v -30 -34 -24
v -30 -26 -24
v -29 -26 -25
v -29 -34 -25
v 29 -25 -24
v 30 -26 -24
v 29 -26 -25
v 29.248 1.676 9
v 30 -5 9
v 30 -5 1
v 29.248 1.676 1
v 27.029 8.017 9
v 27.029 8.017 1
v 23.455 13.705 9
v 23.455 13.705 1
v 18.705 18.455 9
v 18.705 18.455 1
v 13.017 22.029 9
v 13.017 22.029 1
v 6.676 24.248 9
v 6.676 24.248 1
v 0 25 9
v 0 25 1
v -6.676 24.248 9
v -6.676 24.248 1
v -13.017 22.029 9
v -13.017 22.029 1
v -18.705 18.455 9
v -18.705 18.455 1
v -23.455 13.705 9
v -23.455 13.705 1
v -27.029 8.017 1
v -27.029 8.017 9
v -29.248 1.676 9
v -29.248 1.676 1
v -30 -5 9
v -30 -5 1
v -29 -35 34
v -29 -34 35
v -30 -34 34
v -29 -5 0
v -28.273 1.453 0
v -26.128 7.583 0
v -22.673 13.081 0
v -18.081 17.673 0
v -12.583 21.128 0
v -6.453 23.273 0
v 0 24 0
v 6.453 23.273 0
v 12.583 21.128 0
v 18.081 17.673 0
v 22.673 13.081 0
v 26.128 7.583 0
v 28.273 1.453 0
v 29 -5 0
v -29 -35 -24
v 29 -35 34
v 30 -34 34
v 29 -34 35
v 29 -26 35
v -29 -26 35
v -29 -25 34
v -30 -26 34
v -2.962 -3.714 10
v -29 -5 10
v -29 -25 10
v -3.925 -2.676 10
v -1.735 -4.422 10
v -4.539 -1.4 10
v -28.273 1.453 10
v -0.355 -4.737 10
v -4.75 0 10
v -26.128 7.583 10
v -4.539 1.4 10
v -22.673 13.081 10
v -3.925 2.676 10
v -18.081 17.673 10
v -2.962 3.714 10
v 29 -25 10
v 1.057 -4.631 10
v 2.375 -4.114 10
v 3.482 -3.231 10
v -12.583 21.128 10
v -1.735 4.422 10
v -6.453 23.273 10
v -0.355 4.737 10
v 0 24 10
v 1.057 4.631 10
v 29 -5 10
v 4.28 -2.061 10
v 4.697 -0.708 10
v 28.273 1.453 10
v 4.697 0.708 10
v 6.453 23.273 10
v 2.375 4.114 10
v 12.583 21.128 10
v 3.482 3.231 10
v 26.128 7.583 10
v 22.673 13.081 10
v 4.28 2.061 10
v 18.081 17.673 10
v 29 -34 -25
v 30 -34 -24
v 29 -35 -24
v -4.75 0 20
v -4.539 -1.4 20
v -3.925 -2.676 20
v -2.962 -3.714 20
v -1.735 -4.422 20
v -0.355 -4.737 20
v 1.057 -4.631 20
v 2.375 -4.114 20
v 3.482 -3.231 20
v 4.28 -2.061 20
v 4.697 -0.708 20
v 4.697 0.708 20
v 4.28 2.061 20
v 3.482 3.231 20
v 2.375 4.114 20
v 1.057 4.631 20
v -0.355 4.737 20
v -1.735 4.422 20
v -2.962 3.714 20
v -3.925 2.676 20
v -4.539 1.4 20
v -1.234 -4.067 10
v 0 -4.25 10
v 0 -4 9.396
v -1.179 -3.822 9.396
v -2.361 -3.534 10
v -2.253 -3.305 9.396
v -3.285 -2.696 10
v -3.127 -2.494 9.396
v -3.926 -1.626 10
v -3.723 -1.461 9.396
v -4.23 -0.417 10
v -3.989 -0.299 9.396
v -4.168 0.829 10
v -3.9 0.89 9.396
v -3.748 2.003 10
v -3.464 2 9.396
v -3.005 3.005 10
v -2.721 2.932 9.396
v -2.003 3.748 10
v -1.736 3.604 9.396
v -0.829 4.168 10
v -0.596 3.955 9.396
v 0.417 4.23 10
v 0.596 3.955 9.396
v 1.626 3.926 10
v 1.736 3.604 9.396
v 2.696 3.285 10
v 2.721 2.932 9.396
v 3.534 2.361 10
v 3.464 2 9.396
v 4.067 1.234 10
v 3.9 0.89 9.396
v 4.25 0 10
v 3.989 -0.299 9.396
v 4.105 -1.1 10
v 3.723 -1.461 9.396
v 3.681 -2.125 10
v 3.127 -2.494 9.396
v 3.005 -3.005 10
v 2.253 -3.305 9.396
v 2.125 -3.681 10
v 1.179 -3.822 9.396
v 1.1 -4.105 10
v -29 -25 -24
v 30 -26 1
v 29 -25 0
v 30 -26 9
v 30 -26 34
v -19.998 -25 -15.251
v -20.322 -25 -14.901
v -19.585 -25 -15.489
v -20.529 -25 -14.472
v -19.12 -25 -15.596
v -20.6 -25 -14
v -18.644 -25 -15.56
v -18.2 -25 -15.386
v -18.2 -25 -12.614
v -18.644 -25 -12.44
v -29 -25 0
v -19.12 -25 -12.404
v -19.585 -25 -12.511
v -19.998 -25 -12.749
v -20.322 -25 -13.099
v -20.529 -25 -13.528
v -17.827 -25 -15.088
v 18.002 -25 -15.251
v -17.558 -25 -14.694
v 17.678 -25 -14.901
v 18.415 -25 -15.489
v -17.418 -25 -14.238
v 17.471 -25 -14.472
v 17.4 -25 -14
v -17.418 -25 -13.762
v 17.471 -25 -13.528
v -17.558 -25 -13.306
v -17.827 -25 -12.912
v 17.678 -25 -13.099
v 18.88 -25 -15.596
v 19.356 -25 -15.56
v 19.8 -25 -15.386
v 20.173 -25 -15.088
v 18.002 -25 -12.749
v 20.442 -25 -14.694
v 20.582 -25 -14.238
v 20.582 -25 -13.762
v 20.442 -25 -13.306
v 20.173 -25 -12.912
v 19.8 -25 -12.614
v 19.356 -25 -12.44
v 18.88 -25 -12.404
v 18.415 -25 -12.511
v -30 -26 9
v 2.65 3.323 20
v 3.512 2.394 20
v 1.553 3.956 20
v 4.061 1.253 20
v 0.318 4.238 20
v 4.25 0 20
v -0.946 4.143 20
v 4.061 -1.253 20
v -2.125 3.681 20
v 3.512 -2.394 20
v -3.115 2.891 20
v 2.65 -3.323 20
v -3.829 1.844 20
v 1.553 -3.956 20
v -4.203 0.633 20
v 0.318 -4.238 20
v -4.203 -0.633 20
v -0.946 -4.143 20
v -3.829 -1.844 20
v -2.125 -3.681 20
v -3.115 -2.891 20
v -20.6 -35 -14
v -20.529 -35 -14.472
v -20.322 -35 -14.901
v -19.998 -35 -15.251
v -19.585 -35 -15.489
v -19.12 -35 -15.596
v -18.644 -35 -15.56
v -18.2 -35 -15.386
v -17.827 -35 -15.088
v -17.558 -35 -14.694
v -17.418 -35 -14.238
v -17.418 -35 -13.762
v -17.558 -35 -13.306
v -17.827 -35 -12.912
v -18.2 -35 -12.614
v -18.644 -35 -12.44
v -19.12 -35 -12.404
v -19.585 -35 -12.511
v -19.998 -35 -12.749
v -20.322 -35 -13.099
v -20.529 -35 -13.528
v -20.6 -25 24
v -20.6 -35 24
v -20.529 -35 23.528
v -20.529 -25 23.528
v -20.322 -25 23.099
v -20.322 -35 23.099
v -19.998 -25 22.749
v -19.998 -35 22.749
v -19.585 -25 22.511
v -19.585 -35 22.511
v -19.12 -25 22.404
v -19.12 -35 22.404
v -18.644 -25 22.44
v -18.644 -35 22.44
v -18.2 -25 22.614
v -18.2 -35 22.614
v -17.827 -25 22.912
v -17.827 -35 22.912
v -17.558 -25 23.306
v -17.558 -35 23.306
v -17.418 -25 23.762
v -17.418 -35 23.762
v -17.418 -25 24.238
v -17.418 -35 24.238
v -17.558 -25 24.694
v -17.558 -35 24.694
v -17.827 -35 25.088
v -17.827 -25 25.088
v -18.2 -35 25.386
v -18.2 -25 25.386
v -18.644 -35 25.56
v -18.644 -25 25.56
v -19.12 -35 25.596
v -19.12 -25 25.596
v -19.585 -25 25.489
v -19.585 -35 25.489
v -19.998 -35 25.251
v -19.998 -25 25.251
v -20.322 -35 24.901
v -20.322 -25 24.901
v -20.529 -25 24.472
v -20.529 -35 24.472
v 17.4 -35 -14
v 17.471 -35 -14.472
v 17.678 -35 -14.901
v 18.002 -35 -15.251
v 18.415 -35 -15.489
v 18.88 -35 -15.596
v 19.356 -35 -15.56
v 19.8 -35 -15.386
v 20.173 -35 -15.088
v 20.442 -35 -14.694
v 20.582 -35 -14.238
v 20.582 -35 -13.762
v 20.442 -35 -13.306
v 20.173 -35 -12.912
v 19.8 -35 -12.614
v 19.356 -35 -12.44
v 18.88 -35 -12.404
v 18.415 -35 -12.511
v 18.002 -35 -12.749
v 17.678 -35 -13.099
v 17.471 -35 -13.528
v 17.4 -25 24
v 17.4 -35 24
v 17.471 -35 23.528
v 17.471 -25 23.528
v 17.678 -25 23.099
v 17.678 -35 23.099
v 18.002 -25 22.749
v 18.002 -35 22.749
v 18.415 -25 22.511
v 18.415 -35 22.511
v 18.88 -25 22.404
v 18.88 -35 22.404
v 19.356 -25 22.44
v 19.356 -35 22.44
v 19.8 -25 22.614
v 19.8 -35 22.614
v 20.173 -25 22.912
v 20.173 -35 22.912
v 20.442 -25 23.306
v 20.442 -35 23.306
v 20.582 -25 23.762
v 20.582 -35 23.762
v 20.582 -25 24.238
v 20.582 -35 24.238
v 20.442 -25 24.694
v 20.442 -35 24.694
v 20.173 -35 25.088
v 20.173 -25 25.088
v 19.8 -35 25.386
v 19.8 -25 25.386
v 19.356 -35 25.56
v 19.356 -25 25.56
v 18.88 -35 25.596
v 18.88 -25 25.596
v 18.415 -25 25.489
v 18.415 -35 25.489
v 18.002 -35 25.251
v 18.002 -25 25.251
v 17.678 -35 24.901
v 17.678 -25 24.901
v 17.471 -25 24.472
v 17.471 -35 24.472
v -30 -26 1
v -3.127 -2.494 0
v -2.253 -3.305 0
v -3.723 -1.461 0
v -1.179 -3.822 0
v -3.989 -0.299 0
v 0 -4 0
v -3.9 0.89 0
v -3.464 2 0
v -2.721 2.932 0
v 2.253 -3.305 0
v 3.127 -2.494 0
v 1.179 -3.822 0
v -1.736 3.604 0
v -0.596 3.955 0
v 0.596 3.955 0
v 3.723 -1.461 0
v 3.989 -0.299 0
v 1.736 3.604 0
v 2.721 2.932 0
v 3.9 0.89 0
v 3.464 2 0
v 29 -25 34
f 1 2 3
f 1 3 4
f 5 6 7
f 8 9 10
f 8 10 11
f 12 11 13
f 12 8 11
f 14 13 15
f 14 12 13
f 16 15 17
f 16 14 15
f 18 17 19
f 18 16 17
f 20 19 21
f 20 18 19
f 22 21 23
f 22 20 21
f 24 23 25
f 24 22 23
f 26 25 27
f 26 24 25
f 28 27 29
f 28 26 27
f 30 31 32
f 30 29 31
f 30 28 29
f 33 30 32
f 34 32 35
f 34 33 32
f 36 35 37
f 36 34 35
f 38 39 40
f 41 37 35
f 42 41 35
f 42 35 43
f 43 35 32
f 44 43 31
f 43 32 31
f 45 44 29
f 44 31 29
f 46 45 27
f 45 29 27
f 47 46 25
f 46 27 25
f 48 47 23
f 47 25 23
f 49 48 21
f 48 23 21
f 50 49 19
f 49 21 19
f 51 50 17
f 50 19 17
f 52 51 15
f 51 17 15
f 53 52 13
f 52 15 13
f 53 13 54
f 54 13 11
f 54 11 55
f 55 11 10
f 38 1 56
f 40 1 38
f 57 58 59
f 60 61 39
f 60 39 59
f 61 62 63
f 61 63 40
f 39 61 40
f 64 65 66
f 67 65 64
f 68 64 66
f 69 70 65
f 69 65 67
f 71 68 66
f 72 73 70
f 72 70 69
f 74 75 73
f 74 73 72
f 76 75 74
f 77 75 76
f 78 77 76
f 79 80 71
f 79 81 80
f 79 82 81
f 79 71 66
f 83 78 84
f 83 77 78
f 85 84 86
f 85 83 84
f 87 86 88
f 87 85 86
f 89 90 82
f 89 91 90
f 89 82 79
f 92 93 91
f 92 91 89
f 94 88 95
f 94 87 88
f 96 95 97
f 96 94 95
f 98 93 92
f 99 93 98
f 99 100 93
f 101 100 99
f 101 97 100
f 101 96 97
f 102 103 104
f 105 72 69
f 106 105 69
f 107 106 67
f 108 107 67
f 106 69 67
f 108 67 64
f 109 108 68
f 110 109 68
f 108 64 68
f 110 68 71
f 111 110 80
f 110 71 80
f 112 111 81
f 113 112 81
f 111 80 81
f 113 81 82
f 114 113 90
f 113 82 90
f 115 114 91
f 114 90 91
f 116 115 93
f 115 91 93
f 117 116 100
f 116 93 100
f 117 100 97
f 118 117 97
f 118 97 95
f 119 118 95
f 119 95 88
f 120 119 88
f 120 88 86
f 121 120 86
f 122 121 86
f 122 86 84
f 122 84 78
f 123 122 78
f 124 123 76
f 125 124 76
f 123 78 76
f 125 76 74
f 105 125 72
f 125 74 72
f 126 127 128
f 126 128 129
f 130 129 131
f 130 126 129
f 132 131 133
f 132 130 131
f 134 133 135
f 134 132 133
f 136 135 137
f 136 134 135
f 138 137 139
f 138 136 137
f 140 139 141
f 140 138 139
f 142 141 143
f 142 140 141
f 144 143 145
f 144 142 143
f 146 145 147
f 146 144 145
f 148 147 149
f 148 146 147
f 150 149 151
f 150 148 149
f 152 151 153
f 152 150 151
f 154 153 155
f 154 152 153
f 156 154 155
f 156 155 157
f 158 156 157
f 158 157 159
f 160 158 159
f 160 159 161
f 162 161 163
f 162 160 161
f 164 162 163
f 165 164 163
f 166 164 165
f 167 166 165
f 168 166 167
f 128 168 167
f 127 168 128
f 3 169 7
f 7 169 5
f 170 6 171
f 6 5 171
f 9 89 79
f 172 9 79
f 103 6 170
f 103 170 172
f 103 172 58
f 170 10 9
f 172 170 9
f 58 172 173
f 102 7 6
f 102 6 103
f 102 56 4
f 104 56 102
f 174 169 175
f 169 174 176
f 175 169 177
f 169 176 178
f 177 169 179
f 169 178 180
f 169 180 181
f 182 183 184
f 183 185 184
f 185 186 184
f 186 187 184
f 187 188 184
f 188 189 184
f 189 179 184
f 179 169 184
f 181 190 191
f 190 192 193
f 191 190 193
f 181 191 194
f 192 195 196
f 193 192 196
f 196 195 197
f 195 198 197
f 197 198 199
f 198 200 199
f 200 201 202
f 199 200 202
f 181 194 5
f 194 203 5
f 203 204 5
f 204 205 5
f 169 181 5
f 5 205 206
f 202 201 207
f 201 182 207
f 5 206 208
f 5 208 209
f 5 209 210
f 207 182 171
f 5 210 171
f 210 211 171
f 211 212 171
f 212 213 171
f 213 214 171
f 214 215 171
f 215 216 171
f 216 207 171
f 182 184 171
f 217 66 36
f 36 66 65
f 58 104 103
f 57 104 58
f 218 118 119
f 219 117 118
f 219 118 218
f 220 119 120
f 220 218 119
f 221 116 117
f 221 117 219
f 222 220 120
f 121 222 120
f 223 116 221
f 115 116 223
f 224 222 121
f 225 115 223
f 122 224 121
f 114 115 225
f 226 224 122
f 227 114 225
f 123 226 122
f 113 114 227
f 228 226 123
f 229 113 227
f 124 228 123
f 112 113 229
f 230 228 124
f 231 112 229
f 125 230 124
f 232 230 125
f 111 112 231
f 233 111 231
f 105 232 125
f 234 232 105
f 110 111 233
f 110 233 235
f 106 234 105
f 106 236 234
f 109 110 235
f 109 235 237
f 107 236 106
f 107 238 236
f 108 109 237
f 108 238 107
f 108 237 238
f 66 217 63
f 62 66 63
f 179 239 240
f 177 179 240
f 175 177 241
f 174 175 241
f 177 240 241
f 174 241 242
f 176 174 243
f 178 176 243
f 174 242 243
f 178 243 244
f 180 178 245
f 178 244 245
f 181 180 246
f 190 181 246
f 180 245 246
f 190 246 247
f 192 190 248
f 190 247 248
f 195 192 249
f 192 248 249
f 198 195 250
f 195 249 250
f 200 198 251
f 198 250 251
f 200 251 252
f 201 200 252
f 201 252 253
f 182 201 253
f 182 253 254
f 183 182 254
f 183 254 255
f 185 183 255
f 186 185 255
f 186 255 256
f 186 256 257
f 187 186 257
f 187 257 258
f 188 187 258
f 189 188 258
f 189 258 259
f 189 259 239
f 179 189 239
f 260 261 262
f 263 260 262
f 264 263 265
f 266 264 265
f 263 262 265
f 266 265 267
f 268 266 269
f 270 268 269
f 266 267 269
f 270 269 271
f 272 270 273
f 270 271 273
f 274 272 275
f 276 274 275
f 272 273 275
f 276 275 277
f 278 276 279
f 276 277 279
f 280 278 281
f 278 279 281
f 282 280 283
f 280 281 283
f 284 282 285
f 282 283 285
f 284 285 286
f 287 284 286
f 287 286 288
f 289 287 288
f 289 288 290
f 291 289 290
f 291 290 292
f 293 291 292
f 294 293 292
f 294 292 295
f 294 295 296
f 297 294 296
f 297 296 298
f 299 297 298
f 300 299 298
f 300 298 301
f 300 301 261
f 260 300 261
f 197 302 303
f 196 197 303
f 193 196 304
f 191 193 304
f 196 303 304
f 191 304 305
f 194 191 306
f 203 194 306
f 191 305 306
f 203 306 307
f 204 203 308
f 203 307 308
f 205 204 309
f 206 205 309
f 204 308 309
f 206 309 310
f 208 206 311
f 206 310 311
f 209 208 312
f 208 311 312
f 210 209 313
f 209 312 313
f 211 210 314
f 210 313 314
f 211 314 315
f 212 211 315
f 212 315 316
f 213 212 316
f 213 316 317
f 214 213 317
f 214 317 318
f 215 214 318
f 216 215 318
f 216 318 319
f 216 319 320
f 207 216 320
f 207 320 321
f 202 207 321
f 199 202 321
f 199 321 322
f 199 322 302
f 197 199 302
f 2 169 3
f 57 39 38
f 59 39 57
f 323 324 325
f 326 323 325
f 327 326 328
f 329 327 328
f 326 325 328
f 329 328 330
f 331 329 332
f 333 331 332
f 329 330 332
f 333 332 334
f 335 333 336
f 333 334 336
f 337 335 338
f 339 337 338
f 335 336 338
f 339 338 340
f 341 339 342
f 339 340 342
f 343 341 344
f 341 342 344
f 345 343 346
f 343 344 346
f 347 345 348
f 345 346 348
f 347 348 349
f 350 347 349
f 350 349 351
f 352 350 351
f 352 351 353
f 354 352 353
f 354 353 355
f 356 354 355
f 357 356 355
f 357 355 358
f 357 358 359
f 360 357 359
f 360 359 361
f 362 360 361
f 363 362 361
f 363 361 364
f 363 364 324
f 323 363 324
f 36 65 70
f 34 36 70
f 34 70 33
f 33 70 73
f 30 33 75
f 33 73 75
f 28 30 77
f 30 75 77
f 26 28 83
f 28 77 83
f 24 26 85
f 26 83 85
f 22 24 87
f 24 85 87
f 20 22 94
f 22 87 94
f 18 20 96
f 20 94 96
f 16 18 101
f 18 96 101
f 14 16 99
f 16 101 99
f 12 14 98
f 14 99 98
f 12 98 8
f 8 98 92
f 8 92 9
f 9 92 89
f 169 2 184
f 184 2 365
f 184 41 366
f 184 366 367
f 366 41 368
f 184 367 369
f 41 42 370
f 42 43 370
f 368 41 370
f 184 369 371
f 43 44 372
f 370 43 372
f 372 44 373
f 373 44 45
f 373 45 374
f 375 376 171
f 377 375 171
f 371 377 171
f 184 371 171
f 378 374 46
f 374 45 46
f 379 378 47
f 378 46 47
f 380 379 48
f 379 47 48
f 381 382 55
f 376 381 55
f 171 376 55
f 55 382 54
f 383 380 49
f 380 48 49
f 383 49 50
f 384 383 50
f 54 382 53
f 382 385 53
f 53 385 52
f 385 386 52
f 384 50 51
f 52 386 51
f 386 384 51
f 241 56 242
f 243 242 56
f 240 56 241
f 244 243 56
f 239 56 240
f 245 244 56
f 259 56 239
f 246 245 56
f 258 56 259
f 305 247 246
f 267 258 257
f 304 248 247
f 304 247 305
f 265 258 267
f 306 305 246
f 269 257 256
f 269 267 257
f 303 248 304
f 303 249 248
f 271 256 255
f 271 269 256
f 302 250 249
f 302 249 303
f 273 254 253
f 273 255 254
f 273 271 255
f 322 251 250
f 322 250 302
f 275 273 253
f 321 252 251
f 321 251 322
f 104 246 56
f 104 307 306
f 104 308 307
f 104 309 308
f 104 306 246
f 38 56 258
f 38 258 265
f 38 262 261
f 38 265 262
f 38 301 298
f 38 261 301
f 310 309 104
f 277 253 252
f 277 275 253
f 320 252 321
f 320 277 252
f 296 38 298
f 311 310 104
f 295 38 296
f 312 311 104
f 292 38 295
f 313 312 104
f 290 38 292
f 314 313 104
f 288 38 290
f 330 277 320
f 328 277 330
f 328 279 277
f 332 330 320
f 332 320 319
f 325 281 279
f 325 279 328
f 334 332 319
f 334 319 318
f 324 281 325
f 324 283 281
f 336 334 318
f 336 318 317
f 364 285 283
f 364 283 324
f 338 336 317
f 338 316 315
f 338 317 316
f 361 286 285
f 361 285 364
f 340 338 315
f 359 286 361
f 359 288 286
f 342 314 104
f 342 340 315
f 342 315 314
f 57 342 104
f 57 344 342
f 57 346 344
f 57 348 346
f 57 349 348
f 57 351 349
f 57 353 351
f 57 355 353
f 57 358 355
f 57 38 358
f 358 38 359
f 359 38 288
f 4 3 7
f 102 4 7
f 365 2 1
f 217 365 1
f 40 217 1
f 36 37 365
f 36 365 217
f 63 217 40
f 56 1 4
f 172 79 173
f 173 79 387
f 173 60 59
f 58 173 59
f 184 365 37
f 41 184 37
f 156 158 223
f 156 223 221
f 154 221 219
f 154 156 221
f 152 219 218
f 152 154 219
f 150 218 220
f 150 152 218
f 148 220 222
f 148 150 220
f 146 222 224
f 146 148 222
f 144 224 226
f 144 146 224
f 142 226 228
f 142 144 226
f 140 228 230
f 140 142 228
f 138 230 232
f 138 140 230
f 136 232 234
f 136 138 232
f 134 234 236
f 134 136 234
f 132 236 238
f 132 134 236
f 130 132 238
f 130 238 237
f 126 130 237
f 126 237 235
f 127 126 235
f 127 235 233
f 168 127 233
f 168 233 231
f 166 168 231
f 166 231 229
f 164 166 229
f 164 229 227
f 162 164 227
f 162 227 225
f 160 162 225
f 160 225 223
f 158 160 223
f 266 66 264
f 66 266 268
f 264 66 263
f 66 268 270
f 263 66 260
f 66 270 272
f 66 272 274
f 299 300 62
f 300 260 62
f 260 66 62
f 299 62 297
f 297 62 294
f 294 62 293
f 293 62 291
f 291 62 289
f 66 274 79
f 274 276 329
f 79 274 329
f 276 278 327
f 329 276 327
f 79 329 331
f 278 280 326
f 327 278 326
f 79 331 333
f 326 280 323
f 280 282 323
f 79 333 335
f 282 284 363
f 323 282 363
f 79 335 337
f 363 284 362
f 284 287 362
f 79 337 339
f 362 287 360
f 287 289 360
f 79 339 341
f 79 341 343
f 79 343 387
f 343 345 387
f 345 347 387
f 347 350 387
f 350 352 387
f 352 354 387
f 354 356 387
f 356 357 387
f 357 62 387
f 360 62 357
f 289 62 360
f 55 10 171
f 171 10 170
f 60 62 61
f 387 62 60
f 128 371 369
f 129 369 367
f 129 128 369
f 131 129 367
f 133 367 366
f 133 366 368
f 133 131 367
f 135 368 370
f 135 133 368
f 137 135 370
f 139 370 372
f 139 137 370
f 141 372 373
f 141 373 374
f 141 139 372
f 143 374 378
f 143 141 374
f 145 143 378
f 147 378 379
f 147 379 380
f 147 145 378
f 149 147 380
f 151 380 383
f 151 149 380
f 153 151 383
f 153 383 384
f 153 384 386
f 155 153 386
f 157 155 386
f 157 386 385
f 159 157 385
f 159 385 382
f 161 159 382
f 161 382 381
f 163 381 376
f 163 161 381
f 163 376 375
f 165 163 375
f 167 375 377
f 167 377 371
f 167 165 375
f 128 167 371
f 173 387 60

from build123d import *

# Parameters (mm, degrees)
SKETCH_1_W      = 60
SKETCH_1_H      = 50
EXTRUDE_1_DEPTH = 10
SKETCH_8_W      = 60
SKETCH_8_H      = 60
EXTRUDE_2_DEPTH = 10
SKETCH_9_R      = 4.75
SKETCH_9_R_2    = 4.25
EXTRUDE_3_DEPTH = 10
FILLET_1_RADIUS = 30
FILLET_1_LENGTH = 10
CHAMFER_1_SIZE  = 1
HOLE_WIZARD_4_D = 3.2


with BuildPart() as part:
    # 草图1 → 凸台-拉伸1 (new body)
    with BuildSketch(Plane.XY):
        Rectangle(SKETCH_1_W, SKETCH_1_H)
    extrude(amount=EXTRUDE_1_DEPTH)

    # 草图3 → 孔1 (revolve, cut)
    with BuildSketch(Plane(origin=(0, 0, 10), x_dir=(0, -1, 0), z_dir=(1, 0, 0))):
        Polygon((0, 0), (0, 10), (4, 10), (4, 0.603553391), (4.25, 0), align=None)
    revolve(axis=Axis((0, 0, 16.445314094), (0, 0, -1)), mode=Mode.SUBTRACT)

    # 草图8 → 凸台-拉伸2 (add)
    with BuildSketch(Plane.XZ.offset(25)):
        with Locations((0, 5)):
            Rectangle(SKETCH_8_W, SKETCH_8_H)
    extrude(amount=EXTRUDE_2_DEPTH)

    # 草图9 → 凸台-拉伸3 (add)
    with BuildSketch(Plane.XY.offset(10)):
        with Locations(Location((0, 0, 0), (0, 0, 180))):
            Circle(SKETCH_9_R)
        Circle(SKETCH_9_R_2, mode=Mode.SUBTRACT)
    extrude(amount=EXTRUDE_3_DEPTH)

    # 圆角1: full round fillet: the end face becomes a half cylinder, R = half its width
    fillet_1_face = Plane((0, 25, 5), x_dir=(0, 0, 1), z_dir=(0, 1, 0))  # on the end face: x along it, z out of the body
    fillet_1_slab = fillet_1_face.offset(-FILLET_1_RADIUS / 2) * Box(FILLET_1_LENGTH, 2 * FILLET_1_RADIUS, FILLET_1_RADIUS, mode=Mode.PRIVATE)  # the body's end, R deep
    fillet_1_round = Plane((0, -5, 5), x_dir=(0, 1, 0), z_dir=(0, 0, 1)) * Cylinder(FILLET_1_RADIUS, FILLET_1_LENGTH, mode=Mode.PRIVATE)  # its axis R under the face
    add(fillet_1_slab - fillet_1_round, mode=Mode.SUBTRACT)

    # 倒角1
    chamfer_1_edges = [part.edges().sort_by_distance(p)[0] for p in [
        (30, -25, -12.5),
        (30, -25, 22.5),
        (30, -30, -25),
        (0, -25, 35),
        (30, -30, 35),
        (-30, -25, 22.5),
        (-30, -25, -12.5),
        (-30, -30, 35),
        (0, -25, -25),
        (-30, -30, -25),
        (30, -35, 5),
        (0, -35, 35),
        (-30, -35, 5),
        (0, -35, -25),
        (-30, -15, 0),
        (-30, -15, 10),
        (0, 25, 10),
        (0, 25, 0),
        (30, -15, 10),
        (30, -15, 0),
    ]]
    chamfer(chamfer_1_edges, length=CHAMFER_1_SIZE)

    # 孔4 (through all)
    with Locations(Plane(origin=(0, -25, 0), x_dir=(1, 0, 0), z_dir=(0, 1, 0))):
        with Locations((-19, 14), (19, 14), (19, -24), (-19, -24)):
            Hole(HOLE_WIZARD_4_D / 2)


solid = part.part
